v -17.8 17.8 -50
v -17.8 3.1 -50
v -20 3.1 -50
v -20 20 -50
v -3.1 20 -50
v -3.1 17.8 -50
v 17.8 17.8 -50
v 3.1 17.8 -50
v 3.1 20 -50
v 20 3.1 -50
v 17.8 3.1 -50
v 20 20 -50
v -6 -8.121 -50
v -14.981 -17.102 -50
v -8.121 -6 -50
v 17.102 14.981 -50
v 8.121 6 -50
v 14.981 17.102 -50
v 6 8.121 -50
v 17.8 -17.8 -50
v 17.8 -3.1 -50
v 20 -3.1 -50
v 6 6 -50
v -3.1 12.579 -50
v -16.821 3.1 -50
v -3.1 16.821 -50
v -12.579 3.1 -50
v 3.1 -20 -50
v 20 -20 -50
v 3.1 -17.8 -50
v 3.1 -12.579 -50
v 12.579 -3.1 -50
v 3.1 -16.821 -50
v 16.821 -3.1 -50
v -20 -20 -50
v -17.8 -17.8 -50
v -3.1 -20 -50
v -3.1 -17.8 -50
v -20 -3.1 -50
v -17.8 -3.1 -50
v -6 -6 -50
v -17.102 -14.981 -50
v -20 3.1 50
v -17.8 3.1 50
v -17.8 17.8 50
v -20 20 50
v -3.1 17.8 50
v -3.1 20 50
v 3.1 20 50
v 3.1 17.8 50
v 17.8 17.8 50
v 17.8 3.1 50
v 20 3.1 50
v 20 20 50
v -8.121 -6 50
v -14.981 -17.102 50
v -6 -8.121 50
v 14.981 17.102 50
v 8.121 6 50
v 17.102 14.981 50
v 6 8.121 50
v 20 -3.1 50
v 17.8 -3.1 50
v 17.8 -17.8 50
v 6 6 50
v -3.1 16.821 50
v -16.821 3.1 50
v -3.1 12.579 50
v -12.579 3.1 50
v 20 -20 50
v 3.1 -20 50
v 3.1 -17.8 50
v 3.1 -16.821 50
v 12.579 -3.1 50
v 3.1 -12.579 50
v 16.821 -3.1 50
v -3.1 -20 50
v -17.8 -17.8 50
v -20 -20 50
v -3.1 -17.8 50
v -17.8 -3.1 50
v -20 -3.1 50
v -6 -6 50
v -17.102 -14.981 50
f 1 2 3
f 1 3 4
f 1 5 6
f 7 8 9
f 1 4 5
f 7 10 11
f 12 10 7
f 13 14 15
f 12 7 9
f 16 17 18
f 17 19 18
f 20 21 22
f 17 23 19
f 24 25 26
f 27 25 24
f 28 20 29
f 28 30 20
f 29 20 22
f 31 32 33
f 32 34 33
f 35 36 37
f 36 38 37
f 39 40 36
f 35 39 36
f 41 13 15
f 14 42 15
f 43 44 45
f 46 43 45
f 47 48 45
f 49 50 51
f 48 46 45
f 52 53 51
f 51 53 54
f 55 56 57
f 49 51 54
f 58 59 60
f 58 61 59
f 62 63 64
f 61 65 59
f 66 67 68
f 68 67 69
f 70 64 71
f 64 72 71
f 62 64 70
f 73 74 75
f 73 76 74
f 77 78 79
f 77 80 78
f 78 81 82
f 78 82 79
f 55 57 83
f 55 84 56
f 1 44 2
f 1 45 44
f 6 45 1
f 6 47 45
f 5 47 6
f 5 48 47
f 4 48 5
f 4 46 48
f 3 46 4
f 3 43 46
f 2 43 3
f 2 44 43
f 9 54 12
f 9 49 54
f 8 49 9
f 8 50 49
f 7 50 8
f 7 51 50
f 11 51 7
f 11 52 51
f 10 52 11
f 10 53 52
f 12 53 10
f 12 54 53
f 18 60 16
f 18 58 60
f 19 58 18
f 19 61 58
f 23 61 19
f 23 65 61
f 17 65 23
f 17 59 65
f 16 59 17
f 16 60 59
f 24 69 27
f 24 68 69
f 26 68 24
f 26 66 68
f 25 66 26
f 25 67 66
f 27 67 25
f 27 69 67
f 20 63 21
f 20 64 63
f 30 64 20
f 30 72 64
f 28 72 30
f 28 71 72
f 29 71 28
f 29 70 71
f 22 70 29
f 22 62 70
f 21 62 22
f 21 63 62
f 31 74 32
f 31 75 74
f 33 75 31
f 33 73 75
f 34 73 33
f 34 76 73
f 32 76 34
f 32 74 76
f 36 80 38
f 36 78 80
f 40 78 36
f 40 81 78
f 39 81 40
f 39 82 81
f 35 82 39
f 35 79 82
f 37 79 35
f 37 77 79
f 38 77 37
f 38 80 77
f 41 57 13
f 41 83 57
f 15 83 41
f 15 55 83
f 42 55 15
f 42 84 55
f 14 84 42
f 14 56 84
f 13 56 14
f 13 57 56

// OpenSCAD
// 40x40 T-slot aluminium extrusion (approximate), 100mm long
// FIX: ensure ONE connected solid (no floating corner segments, no split halves).
// Approach: create a connected 2D "base" (outer ring + diagonal corner bridges + center bridges),
// then subtract the T-slot voids + center bore. Bridges overlap by 1–2mm to guarantee attachment.

$fn = 96;

size = 40;
len  = 100;

// Profile tuning (mm)
wall            = 2.2;   // outer wall thickness
slot_open       = 6.2;   // opening at the outer face
slot_depth      = 10.5;  // depth of the slot from the outer face
slot_cavity_w   = 12.0;  // wider cavity behind the opening
slot_cavity_d   = 6.5;   // depth of the wider cavity
center_bore_r   = 5.0;   // central bore radius

// Connectivity / webbing
web_thickness   = 3.2;   // thickness of center cross webs
bridge_thick    = 3.0;   // thickness of diagonal corner bridges

// Overlap to guarantee physical attachment (mm)
overlap = 1.2;

// Small epsilon for robust boolean ops
eps = 0.05;

module base_solid_2d() {
    // Build a connected solid first (outer ring + internal bridges),
    // then subtract slots/bore from it.
    union() {
        // Outer ring (continuous perimeter)
        difference() {
            square([size, size], center=true);
            square([size - 2*wall, size - 2*wall], center=true);
        }

        // Center plus-shaped webs that overlap into the ring
        inner = size - 2*wall;
        web_len = inner + 2*overlap;

        square([web_len, web_thickness], center=true); // horizontal
        square([web_thickness, web_len], center=true); // vertical

        // Diagonal corner bridges to prevent 4 isolated corner quadrants
        // and to eliminate the "two long parallel bodies" split.
        // These bridges connect each corner region to the center webs.
        // Place bridge centers along the diagonal at ~1/4 of the inner span.
        diag_pos = inner/4;
        for (sx = [-1, 1], sy = [-1, 1]) {
            translate([sx*diag_pos, sy*diag_pos])
                rotate(45)
                    square([inner/2 + 2*overlap, bridge_thick], center=true);
        }
    }
}

module tslot_voids_2d() {
    union() {
        // Central bore
        circle(r=center_bore_r);

        // Four T-slots (one per side): opening + inner cavity
        // +X
        translate([ size/2 - slot_depth/2, 0])
            square([slot_depth + eps, slot_open], center=true);
        translate([ size/2 - slot_depth - slot_cavity_d/2, 0])
            square([slot_cavity_d + eps, slot_cavity_w], center=true);

        // -X
        translate([-size/2 + slot_depth/2, 0])
            square([slot_depth + eps, slot_open], center=true);
        translate([-size/2 + slot_depth + slot_cavity_d/2, 0])
            square([slot_cavity_d + eps, slot_cavity_w], center=true);

        // +Y
        translate([0,  size/2 - slot_depth/2])
            square([slot_open, slot_depth + eps], center=true);
        translate([0,  size/2 - slot_depth - slot_cavity_d/2])
            square([slot_cavity_w, slot_cavity_d + eps], center=true);

        // -Y
        translate([0, -size/2 + slot_depth/2])
            square([slot_open, slot_depth + eps], center=true);
        translate([0, -size/2 + slot_depth + slot_cavity_d/2])
            square([slot_cavity_w, slot_cavity_d + eps], center=true);
    }
}

module tslot_40x40_2d_connected() {
    difference() {
        base_solid_2d();
        tslot_voids_2d();
    }
}

module extrusion_40x40(L=100) {
    union() {
        linear_extrude(height=L, center=true, convexity=10)
            tslot_40x40_2d_connected();
    }
}

extrusion_40x40(len);
